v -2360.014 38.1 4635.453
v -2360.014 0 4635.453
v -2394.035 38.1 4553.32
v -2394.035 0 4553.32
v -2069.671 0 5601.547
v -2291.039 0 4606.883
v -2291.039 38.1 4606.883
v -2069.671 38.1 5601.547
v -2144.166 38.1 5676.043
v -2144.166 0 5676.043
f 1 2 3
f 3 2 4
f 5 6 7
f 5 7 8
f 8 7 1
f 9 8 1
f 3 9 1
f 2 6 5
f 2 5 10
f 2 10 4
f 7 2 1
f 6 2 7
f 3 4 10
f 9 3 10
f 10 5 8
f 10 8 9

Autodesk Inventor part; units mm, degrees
ref_plane "YZ Plane" through (0, 0, 0) normal (1, 0, 0) x (0, 1, 0)
ref_plane "XZ Plane" through (0, 0, 0) normal (0, 1, 0) x (-1, 0, 0)
ref_plane "XY Plane" through (0, 0, 0) normal (0, 0, 1) x (1, 0, 0)
sketch "Sketch1" plane through (0, 0, 0) normal (0, 1, 0) x (-1, 0, 0)
  line L0 (0, 0) -> (0, -1219.2)
  line L1 (0, 0) -> (88.9, 0)
  line L2 (88.9, 0) -> (88.9, -1219.2)
  line L3 (88.9, -1219.2) -> (0, -1219.2)
  line L4 (0, 0) -> (0, 1219.2) construction
  line L5 (0, 1219.2) -> (1219.2, 1219.2) construction
  line L6 (0, 1219.2) -> (0, 3657.6) construction
  line L7 (0, 3657.6) -> (0, 4876.8) construction
  line L8 (0, 4876.8) -> (0, 6096) construction
  line L9 (0, -1219.2) -> (2438.4, -1219.2) construction
  line L10 (0, 6096) -> (2438.4, 6096) construction
  line L11 (2438.4, 6096) -> (2438.4, -1219.2) construction
  line L12 (0, 3657.6) -> (0, 3352.8) construction
  line L13 (0, 3352.8) -> (2438.4, 3352.8) construction
  line L14 (2438.4, 3352.8) -> (1219.2, 3352.8)
  line L15 (1219.2, 3352.8) -> (1219.2, 3263.9)
  line L16 (1219.2, 3263.9) -> (2438.4, 3263.9)
  line L17 (2438.4, 3263.9) -> (2438.4, 3352.8)
  line L18 (0, 6096) -> (862.1046, 6958.1046)
  line L19 (862.1046, 6958.1046) -> (924.9664, 6895.2428)
  line L20 (924.9664, 6895.2428) -> (62.8618, 6033.1382)
  line L21 (62.8618, 6033.1382) -> (0, 6096)
  line L22 (0, 4876.8) -> (1219.2, 4876.8) construction
  line L23 (1219.2, 4876.8) -> (2081.3046, 5738.9046)
  line L24 (1219.2, 1219.2) -> (2081.3046, 357.0954)
  line L25 (2081.3046, 357.0954) -> (2018.4428, 294.2336)
  line L26 (2018.4428, 294.2336) -> (1156.3382, 1156.3382)
  line L27 (1156.3382, 1156.3382) -> (1219.2, 1219.2)
  line L28 (2018.4428, 294.2336) -> (88.9, -1219.2)
  line L29 (2081.3046, 357.0954) -> (2144.1664, 419.9572)
  line L30 (2144.1664, 419.9572) -> (1282.0618, 1282.0618)
  line L31 (1282.0618, 1282.0618) -> (1219.2, 1219.2)
  line L32 (2438.4, 3352.8) -> (2438.4, 3441.7)
  line L33 (2438.4, 3441.7) -> (1219.2, 3441.7)
  line L34 (1219.2, 3441.7) -> (1219.2, 3352.8)
  line L35 (1156.3382, 4939.6618) -> (1282.0618, 4813.9382)
  line L36 (2018.4428, 5801.7664) -> (2144.1664, 5676.0428)
  line L37 (1282.0618, 4813.9382) -> (2144.1664, 5676.0428)
  line L38 (2018.4428, 5801.7664) -> (1156.3382, 4939.6618)
  line L39 (2018.4428, 5801.7664) -> (924.9664, 6895.2428)
  line L40 (62.8618, 6033.1382) -> (1156.3382, 4939.6618)
  line L41 (1233.6206, 4168.8855) -> (1267.6412, 4086.7527)
  line L42 (1263.7078, 2313.9849) -> (1230.0006, 2231.7229)
  arc A0 (862.1046, 6958.1046) -> (0, 6096) centre (431.0523, 6527.0523) ccw
  line L43 (1246.8542, 2272.8539) -> (2375.0183, 1810.583)
  line L44 (2391.8719, 1851.7139) -> (2358.1646, 1769.452)
  line L45 (2391.8719, 1851.7139) -> (1263.7078, 2313.9849)
  line L46 (1230.0006, 2231.7229) -> (2358.1646, 1769.452)
  line L47 (1230.0006, 2231.7229) -> (1219.2, 3263.9)
  line L48 (2144.1664, 419.9572) -> (2391.8719, 1851.7139)
  line L49 (2391.8719, 1851.7139) -> (2438.4, 3263.9)
  line L50 (1219.2, 3441.7) -> (1233.6206, 4168.8855)
  line L51 (1250.6309, 4127.8191) -> (2377.0248, 4594.3867)
  line L52 (2360.0145, 4635.4532) -> (2394.0351, 4553.3203)
  line L53 (2394.0351, 4553.3203) -> (1267.6412, 4086.7527)
  line L54 (2360.0145, 4635.4532) -> (1233.6206, 4168.8855)
  line L55 (2394.0351, 4553.3203) -> (2144.1664, 5676.0428)
  line L56 (2438.4, 3441.7) -> (2394.0351, 4553.3203)
  line L57 (2144.1664, 5676.0428) -> (2057.3895, 5656.7301)
  line L58 (2394.0351, 4553.3203) -> (2305.2058, 4549.7751)
  line L59 (2394.0351, 4553.3203) -> (2307.2582, 4534.0076)
  line L60 (2307.2582, 4534.0076) -> (2057.3895, 5656.7301)
  line L61 (2438.4, 3441.7) -> (2349.5707, 3438.1548)
  line L62 (2349.5707, 3438.1548) -> (2305.2058, 4549.7751)
  line L63 (1219.2, 3441.7) -> (1308.0825, 3439.9374)
  line L64 (1233.6206, 4168.8855) -> (1322.5031, 4167.1229)
  line L65 (1322.5031, 4167.1229) -> (1308.0825, 3439.9374)
  line L66 (2018.4428, 5801.7664) -> (1955.581, 5738.9046)
  line L67 (1955.581, 5738.9046) -> (862.1046, 6832.381)
  line L68 (924.9664, 6895.2428) -> (862.1046, 6832.381)
  line L69 (62.8618, 6033.1382) -> (125.7236, 6096)
  line L70 (62.8618, 6033.1382) -> (125.7236, 6096)
  line L71 (125.7236, 6096) -> (1219.2, 5002.5236)
  line L72 (1156.3382, 1156.3382) -> (0, 0)
  line L73 (0, 0) -> (62.8618, -62.8618)
  line L74 (1156.3382, 1156.3382) -> (1219.2, 1093.4764)
  line L75 (1219.2, 1093.4764) -> (62.8618, -62.8618)
  line L76 (2018.4428, 294.2336) -> (1963.5776, 364.1837)
  line L77 (88.9, -1219.2) -> (34.0348, -1149.2499)
  line L78 (34.0348, -1149.2499) -> (1963.5776, 364.1837)
  line L79 (2144.1664, 419.9572) -> (2056.5677, 435.1125)
  line L80 (2391.8719, 1851.7139) -> (2304.2732, 1866.8692)
  line L81 (2391.8719, 1851.7139) -> (2303.0201, 1854.6414)
  line L82 (2304.2732, 1866.8692) -> (2056.5677, 435.1125)
  line L83 (1230.0006, 2231.7229) -> (1318.8957, 2232.6531)
  line L84 (1219.2, 3263.9) -> (1308.0951, 3264.8302)
  line L85 (1308.0951, 3264.8302) -> (1318.8957, 2232.6531)
  line L86 (2438.4, 3263.9) -> (2349.5482, 3266.8275)
  line L87 (2349.5482, 3266.8275) -> (2303.0201, 1854.6414)
  line L88 (88.9, 0) -> (125.7236, 0)
  line L89 (1233.6206, 4168.8855) -> (1219.2, 4876.8)
  line L90 (1233.6206, 4168.8855) -> (1322.5022, 4170.6961)
  line L91 (1219.2, 4876.8) -> (1308.0816, 4878.6106)
  line L92 (1308.0816, 4878.6106) -> (1322.5022, 4170.6961)
  line L93 (1282.0618, 4813.9382) -> (1309.9674, 4786.0326)
  line L94 (1267.6412, 4086.7527) -> (1318.4756, 3964.0275)
  line L95 (2360.0145, 4635.4532) -> (2374.4273, 4641.4231)
  line L96 (1230.0006, 2231.7229) -> (1219.2, 1219.2)
  line L97 (1230.0006, 2231.7229) -> (1318.8955, 2230.7747)
  line L98 (1219.2, 1219.2) -> (1308.0949, 1218.2518)
  line L99 (1308.0949, 1218.2518) -> (1318.8955, 2230.7747)
  line L100 (1282.0618, 1282.0618) -> (1309.0636, 1309.0636)
  line L101 (1263.7078, 2313.9849) -> (1316.7428, 2438.4)
  line L102 (2358.1646, 1769.452) -> (2376.5379, 1763.082)
  point P0 (1770.957, 2057.4547)
  point P1 (1955.1236, 357.5528)
  point P2 (88.9, -1106.2164)
  point P3 (2292.1025, 1796.5213)
  point P4 (2067.2525, 496.8711)
  point P5 (1318.5187, 2195.4522)
  point P6 (1308.1049, 3263.9)
  point P7 (2349.4518, 3263.9)
  point P8 (2304.1085, 1887.6754)
  point P9 (2306.5112, 4517.0667)
  point P10 (2349.4292, 3441.7)
  point P11 (1308.1175, 3441.7)
  point P12 (2069.6708, 5601.5472)
  point P13 (2291.0394, 4606.8827)
  dimension "d0" = 1219.2
  dimension "d2" = 1219.2
  dimension "d3" = 1219.2
  dimension "d16" = 2438.4
  dimension "d17" = 1219.2
  dimension "d18" = 1219.2
  dimension "d20" = 2438.4
  dimension "d21" = 304.8
  dimension "d22" = 1219.2
  dimension "d23" = 88.9
  dimension "d24" = 1219.2
  dimension "d25" = 45
  dimension "d26" = 88.9
  dimension "d27" = 1219.2
  dimension "d28" = 1219.2
  dimension "d29" = 1219.2
  dimension "d31" = 1219.2
  dimension "d32" = 88.9
  dimension "d33" = 88.9
  dimension "d34" = 88.9
  dimension "d35" = 177.8
  dimension "d36" = 177.8
  dimension "d38" = 88.9
  dimension "d39" = 88.9
  dimension "d43" = 1219.2
  dimension "d44" = 88.9
  dimension "d45" = 1219.2
  dimension "d46" = 88.9
  dimension "d47" = 88.9
  dimension "d48" = 88.9
  dimension "d49" = 88.9
  dimension "d50" = 88.9
  dimension "d51" = 88.9
  dimension "d54" = 88.9
  dimension "d55" = 88.9
  dimension "d57" = 88.9
  dimension "d58" = 88.9
  dimension "d59" = 88.9
  dimension "d60" = 88.9
  dimension "d61" = 88.9
  dimension "d64" = 88.9
  dimension "d65" = 88.9
  dimension "d66" = 88.9
  dimension "d69" = 88.9
  dimension "d70" = 88.9
  dimension "d71" = 88.9
  dimension "d72" = 88.9
extrude "Extrusion1" add sketch "Sketch1" along normal blind 38.1 contours L52 L95 L55 | L95 L54 L60 L37 L55
properties part number "S_2x4x45.283"
